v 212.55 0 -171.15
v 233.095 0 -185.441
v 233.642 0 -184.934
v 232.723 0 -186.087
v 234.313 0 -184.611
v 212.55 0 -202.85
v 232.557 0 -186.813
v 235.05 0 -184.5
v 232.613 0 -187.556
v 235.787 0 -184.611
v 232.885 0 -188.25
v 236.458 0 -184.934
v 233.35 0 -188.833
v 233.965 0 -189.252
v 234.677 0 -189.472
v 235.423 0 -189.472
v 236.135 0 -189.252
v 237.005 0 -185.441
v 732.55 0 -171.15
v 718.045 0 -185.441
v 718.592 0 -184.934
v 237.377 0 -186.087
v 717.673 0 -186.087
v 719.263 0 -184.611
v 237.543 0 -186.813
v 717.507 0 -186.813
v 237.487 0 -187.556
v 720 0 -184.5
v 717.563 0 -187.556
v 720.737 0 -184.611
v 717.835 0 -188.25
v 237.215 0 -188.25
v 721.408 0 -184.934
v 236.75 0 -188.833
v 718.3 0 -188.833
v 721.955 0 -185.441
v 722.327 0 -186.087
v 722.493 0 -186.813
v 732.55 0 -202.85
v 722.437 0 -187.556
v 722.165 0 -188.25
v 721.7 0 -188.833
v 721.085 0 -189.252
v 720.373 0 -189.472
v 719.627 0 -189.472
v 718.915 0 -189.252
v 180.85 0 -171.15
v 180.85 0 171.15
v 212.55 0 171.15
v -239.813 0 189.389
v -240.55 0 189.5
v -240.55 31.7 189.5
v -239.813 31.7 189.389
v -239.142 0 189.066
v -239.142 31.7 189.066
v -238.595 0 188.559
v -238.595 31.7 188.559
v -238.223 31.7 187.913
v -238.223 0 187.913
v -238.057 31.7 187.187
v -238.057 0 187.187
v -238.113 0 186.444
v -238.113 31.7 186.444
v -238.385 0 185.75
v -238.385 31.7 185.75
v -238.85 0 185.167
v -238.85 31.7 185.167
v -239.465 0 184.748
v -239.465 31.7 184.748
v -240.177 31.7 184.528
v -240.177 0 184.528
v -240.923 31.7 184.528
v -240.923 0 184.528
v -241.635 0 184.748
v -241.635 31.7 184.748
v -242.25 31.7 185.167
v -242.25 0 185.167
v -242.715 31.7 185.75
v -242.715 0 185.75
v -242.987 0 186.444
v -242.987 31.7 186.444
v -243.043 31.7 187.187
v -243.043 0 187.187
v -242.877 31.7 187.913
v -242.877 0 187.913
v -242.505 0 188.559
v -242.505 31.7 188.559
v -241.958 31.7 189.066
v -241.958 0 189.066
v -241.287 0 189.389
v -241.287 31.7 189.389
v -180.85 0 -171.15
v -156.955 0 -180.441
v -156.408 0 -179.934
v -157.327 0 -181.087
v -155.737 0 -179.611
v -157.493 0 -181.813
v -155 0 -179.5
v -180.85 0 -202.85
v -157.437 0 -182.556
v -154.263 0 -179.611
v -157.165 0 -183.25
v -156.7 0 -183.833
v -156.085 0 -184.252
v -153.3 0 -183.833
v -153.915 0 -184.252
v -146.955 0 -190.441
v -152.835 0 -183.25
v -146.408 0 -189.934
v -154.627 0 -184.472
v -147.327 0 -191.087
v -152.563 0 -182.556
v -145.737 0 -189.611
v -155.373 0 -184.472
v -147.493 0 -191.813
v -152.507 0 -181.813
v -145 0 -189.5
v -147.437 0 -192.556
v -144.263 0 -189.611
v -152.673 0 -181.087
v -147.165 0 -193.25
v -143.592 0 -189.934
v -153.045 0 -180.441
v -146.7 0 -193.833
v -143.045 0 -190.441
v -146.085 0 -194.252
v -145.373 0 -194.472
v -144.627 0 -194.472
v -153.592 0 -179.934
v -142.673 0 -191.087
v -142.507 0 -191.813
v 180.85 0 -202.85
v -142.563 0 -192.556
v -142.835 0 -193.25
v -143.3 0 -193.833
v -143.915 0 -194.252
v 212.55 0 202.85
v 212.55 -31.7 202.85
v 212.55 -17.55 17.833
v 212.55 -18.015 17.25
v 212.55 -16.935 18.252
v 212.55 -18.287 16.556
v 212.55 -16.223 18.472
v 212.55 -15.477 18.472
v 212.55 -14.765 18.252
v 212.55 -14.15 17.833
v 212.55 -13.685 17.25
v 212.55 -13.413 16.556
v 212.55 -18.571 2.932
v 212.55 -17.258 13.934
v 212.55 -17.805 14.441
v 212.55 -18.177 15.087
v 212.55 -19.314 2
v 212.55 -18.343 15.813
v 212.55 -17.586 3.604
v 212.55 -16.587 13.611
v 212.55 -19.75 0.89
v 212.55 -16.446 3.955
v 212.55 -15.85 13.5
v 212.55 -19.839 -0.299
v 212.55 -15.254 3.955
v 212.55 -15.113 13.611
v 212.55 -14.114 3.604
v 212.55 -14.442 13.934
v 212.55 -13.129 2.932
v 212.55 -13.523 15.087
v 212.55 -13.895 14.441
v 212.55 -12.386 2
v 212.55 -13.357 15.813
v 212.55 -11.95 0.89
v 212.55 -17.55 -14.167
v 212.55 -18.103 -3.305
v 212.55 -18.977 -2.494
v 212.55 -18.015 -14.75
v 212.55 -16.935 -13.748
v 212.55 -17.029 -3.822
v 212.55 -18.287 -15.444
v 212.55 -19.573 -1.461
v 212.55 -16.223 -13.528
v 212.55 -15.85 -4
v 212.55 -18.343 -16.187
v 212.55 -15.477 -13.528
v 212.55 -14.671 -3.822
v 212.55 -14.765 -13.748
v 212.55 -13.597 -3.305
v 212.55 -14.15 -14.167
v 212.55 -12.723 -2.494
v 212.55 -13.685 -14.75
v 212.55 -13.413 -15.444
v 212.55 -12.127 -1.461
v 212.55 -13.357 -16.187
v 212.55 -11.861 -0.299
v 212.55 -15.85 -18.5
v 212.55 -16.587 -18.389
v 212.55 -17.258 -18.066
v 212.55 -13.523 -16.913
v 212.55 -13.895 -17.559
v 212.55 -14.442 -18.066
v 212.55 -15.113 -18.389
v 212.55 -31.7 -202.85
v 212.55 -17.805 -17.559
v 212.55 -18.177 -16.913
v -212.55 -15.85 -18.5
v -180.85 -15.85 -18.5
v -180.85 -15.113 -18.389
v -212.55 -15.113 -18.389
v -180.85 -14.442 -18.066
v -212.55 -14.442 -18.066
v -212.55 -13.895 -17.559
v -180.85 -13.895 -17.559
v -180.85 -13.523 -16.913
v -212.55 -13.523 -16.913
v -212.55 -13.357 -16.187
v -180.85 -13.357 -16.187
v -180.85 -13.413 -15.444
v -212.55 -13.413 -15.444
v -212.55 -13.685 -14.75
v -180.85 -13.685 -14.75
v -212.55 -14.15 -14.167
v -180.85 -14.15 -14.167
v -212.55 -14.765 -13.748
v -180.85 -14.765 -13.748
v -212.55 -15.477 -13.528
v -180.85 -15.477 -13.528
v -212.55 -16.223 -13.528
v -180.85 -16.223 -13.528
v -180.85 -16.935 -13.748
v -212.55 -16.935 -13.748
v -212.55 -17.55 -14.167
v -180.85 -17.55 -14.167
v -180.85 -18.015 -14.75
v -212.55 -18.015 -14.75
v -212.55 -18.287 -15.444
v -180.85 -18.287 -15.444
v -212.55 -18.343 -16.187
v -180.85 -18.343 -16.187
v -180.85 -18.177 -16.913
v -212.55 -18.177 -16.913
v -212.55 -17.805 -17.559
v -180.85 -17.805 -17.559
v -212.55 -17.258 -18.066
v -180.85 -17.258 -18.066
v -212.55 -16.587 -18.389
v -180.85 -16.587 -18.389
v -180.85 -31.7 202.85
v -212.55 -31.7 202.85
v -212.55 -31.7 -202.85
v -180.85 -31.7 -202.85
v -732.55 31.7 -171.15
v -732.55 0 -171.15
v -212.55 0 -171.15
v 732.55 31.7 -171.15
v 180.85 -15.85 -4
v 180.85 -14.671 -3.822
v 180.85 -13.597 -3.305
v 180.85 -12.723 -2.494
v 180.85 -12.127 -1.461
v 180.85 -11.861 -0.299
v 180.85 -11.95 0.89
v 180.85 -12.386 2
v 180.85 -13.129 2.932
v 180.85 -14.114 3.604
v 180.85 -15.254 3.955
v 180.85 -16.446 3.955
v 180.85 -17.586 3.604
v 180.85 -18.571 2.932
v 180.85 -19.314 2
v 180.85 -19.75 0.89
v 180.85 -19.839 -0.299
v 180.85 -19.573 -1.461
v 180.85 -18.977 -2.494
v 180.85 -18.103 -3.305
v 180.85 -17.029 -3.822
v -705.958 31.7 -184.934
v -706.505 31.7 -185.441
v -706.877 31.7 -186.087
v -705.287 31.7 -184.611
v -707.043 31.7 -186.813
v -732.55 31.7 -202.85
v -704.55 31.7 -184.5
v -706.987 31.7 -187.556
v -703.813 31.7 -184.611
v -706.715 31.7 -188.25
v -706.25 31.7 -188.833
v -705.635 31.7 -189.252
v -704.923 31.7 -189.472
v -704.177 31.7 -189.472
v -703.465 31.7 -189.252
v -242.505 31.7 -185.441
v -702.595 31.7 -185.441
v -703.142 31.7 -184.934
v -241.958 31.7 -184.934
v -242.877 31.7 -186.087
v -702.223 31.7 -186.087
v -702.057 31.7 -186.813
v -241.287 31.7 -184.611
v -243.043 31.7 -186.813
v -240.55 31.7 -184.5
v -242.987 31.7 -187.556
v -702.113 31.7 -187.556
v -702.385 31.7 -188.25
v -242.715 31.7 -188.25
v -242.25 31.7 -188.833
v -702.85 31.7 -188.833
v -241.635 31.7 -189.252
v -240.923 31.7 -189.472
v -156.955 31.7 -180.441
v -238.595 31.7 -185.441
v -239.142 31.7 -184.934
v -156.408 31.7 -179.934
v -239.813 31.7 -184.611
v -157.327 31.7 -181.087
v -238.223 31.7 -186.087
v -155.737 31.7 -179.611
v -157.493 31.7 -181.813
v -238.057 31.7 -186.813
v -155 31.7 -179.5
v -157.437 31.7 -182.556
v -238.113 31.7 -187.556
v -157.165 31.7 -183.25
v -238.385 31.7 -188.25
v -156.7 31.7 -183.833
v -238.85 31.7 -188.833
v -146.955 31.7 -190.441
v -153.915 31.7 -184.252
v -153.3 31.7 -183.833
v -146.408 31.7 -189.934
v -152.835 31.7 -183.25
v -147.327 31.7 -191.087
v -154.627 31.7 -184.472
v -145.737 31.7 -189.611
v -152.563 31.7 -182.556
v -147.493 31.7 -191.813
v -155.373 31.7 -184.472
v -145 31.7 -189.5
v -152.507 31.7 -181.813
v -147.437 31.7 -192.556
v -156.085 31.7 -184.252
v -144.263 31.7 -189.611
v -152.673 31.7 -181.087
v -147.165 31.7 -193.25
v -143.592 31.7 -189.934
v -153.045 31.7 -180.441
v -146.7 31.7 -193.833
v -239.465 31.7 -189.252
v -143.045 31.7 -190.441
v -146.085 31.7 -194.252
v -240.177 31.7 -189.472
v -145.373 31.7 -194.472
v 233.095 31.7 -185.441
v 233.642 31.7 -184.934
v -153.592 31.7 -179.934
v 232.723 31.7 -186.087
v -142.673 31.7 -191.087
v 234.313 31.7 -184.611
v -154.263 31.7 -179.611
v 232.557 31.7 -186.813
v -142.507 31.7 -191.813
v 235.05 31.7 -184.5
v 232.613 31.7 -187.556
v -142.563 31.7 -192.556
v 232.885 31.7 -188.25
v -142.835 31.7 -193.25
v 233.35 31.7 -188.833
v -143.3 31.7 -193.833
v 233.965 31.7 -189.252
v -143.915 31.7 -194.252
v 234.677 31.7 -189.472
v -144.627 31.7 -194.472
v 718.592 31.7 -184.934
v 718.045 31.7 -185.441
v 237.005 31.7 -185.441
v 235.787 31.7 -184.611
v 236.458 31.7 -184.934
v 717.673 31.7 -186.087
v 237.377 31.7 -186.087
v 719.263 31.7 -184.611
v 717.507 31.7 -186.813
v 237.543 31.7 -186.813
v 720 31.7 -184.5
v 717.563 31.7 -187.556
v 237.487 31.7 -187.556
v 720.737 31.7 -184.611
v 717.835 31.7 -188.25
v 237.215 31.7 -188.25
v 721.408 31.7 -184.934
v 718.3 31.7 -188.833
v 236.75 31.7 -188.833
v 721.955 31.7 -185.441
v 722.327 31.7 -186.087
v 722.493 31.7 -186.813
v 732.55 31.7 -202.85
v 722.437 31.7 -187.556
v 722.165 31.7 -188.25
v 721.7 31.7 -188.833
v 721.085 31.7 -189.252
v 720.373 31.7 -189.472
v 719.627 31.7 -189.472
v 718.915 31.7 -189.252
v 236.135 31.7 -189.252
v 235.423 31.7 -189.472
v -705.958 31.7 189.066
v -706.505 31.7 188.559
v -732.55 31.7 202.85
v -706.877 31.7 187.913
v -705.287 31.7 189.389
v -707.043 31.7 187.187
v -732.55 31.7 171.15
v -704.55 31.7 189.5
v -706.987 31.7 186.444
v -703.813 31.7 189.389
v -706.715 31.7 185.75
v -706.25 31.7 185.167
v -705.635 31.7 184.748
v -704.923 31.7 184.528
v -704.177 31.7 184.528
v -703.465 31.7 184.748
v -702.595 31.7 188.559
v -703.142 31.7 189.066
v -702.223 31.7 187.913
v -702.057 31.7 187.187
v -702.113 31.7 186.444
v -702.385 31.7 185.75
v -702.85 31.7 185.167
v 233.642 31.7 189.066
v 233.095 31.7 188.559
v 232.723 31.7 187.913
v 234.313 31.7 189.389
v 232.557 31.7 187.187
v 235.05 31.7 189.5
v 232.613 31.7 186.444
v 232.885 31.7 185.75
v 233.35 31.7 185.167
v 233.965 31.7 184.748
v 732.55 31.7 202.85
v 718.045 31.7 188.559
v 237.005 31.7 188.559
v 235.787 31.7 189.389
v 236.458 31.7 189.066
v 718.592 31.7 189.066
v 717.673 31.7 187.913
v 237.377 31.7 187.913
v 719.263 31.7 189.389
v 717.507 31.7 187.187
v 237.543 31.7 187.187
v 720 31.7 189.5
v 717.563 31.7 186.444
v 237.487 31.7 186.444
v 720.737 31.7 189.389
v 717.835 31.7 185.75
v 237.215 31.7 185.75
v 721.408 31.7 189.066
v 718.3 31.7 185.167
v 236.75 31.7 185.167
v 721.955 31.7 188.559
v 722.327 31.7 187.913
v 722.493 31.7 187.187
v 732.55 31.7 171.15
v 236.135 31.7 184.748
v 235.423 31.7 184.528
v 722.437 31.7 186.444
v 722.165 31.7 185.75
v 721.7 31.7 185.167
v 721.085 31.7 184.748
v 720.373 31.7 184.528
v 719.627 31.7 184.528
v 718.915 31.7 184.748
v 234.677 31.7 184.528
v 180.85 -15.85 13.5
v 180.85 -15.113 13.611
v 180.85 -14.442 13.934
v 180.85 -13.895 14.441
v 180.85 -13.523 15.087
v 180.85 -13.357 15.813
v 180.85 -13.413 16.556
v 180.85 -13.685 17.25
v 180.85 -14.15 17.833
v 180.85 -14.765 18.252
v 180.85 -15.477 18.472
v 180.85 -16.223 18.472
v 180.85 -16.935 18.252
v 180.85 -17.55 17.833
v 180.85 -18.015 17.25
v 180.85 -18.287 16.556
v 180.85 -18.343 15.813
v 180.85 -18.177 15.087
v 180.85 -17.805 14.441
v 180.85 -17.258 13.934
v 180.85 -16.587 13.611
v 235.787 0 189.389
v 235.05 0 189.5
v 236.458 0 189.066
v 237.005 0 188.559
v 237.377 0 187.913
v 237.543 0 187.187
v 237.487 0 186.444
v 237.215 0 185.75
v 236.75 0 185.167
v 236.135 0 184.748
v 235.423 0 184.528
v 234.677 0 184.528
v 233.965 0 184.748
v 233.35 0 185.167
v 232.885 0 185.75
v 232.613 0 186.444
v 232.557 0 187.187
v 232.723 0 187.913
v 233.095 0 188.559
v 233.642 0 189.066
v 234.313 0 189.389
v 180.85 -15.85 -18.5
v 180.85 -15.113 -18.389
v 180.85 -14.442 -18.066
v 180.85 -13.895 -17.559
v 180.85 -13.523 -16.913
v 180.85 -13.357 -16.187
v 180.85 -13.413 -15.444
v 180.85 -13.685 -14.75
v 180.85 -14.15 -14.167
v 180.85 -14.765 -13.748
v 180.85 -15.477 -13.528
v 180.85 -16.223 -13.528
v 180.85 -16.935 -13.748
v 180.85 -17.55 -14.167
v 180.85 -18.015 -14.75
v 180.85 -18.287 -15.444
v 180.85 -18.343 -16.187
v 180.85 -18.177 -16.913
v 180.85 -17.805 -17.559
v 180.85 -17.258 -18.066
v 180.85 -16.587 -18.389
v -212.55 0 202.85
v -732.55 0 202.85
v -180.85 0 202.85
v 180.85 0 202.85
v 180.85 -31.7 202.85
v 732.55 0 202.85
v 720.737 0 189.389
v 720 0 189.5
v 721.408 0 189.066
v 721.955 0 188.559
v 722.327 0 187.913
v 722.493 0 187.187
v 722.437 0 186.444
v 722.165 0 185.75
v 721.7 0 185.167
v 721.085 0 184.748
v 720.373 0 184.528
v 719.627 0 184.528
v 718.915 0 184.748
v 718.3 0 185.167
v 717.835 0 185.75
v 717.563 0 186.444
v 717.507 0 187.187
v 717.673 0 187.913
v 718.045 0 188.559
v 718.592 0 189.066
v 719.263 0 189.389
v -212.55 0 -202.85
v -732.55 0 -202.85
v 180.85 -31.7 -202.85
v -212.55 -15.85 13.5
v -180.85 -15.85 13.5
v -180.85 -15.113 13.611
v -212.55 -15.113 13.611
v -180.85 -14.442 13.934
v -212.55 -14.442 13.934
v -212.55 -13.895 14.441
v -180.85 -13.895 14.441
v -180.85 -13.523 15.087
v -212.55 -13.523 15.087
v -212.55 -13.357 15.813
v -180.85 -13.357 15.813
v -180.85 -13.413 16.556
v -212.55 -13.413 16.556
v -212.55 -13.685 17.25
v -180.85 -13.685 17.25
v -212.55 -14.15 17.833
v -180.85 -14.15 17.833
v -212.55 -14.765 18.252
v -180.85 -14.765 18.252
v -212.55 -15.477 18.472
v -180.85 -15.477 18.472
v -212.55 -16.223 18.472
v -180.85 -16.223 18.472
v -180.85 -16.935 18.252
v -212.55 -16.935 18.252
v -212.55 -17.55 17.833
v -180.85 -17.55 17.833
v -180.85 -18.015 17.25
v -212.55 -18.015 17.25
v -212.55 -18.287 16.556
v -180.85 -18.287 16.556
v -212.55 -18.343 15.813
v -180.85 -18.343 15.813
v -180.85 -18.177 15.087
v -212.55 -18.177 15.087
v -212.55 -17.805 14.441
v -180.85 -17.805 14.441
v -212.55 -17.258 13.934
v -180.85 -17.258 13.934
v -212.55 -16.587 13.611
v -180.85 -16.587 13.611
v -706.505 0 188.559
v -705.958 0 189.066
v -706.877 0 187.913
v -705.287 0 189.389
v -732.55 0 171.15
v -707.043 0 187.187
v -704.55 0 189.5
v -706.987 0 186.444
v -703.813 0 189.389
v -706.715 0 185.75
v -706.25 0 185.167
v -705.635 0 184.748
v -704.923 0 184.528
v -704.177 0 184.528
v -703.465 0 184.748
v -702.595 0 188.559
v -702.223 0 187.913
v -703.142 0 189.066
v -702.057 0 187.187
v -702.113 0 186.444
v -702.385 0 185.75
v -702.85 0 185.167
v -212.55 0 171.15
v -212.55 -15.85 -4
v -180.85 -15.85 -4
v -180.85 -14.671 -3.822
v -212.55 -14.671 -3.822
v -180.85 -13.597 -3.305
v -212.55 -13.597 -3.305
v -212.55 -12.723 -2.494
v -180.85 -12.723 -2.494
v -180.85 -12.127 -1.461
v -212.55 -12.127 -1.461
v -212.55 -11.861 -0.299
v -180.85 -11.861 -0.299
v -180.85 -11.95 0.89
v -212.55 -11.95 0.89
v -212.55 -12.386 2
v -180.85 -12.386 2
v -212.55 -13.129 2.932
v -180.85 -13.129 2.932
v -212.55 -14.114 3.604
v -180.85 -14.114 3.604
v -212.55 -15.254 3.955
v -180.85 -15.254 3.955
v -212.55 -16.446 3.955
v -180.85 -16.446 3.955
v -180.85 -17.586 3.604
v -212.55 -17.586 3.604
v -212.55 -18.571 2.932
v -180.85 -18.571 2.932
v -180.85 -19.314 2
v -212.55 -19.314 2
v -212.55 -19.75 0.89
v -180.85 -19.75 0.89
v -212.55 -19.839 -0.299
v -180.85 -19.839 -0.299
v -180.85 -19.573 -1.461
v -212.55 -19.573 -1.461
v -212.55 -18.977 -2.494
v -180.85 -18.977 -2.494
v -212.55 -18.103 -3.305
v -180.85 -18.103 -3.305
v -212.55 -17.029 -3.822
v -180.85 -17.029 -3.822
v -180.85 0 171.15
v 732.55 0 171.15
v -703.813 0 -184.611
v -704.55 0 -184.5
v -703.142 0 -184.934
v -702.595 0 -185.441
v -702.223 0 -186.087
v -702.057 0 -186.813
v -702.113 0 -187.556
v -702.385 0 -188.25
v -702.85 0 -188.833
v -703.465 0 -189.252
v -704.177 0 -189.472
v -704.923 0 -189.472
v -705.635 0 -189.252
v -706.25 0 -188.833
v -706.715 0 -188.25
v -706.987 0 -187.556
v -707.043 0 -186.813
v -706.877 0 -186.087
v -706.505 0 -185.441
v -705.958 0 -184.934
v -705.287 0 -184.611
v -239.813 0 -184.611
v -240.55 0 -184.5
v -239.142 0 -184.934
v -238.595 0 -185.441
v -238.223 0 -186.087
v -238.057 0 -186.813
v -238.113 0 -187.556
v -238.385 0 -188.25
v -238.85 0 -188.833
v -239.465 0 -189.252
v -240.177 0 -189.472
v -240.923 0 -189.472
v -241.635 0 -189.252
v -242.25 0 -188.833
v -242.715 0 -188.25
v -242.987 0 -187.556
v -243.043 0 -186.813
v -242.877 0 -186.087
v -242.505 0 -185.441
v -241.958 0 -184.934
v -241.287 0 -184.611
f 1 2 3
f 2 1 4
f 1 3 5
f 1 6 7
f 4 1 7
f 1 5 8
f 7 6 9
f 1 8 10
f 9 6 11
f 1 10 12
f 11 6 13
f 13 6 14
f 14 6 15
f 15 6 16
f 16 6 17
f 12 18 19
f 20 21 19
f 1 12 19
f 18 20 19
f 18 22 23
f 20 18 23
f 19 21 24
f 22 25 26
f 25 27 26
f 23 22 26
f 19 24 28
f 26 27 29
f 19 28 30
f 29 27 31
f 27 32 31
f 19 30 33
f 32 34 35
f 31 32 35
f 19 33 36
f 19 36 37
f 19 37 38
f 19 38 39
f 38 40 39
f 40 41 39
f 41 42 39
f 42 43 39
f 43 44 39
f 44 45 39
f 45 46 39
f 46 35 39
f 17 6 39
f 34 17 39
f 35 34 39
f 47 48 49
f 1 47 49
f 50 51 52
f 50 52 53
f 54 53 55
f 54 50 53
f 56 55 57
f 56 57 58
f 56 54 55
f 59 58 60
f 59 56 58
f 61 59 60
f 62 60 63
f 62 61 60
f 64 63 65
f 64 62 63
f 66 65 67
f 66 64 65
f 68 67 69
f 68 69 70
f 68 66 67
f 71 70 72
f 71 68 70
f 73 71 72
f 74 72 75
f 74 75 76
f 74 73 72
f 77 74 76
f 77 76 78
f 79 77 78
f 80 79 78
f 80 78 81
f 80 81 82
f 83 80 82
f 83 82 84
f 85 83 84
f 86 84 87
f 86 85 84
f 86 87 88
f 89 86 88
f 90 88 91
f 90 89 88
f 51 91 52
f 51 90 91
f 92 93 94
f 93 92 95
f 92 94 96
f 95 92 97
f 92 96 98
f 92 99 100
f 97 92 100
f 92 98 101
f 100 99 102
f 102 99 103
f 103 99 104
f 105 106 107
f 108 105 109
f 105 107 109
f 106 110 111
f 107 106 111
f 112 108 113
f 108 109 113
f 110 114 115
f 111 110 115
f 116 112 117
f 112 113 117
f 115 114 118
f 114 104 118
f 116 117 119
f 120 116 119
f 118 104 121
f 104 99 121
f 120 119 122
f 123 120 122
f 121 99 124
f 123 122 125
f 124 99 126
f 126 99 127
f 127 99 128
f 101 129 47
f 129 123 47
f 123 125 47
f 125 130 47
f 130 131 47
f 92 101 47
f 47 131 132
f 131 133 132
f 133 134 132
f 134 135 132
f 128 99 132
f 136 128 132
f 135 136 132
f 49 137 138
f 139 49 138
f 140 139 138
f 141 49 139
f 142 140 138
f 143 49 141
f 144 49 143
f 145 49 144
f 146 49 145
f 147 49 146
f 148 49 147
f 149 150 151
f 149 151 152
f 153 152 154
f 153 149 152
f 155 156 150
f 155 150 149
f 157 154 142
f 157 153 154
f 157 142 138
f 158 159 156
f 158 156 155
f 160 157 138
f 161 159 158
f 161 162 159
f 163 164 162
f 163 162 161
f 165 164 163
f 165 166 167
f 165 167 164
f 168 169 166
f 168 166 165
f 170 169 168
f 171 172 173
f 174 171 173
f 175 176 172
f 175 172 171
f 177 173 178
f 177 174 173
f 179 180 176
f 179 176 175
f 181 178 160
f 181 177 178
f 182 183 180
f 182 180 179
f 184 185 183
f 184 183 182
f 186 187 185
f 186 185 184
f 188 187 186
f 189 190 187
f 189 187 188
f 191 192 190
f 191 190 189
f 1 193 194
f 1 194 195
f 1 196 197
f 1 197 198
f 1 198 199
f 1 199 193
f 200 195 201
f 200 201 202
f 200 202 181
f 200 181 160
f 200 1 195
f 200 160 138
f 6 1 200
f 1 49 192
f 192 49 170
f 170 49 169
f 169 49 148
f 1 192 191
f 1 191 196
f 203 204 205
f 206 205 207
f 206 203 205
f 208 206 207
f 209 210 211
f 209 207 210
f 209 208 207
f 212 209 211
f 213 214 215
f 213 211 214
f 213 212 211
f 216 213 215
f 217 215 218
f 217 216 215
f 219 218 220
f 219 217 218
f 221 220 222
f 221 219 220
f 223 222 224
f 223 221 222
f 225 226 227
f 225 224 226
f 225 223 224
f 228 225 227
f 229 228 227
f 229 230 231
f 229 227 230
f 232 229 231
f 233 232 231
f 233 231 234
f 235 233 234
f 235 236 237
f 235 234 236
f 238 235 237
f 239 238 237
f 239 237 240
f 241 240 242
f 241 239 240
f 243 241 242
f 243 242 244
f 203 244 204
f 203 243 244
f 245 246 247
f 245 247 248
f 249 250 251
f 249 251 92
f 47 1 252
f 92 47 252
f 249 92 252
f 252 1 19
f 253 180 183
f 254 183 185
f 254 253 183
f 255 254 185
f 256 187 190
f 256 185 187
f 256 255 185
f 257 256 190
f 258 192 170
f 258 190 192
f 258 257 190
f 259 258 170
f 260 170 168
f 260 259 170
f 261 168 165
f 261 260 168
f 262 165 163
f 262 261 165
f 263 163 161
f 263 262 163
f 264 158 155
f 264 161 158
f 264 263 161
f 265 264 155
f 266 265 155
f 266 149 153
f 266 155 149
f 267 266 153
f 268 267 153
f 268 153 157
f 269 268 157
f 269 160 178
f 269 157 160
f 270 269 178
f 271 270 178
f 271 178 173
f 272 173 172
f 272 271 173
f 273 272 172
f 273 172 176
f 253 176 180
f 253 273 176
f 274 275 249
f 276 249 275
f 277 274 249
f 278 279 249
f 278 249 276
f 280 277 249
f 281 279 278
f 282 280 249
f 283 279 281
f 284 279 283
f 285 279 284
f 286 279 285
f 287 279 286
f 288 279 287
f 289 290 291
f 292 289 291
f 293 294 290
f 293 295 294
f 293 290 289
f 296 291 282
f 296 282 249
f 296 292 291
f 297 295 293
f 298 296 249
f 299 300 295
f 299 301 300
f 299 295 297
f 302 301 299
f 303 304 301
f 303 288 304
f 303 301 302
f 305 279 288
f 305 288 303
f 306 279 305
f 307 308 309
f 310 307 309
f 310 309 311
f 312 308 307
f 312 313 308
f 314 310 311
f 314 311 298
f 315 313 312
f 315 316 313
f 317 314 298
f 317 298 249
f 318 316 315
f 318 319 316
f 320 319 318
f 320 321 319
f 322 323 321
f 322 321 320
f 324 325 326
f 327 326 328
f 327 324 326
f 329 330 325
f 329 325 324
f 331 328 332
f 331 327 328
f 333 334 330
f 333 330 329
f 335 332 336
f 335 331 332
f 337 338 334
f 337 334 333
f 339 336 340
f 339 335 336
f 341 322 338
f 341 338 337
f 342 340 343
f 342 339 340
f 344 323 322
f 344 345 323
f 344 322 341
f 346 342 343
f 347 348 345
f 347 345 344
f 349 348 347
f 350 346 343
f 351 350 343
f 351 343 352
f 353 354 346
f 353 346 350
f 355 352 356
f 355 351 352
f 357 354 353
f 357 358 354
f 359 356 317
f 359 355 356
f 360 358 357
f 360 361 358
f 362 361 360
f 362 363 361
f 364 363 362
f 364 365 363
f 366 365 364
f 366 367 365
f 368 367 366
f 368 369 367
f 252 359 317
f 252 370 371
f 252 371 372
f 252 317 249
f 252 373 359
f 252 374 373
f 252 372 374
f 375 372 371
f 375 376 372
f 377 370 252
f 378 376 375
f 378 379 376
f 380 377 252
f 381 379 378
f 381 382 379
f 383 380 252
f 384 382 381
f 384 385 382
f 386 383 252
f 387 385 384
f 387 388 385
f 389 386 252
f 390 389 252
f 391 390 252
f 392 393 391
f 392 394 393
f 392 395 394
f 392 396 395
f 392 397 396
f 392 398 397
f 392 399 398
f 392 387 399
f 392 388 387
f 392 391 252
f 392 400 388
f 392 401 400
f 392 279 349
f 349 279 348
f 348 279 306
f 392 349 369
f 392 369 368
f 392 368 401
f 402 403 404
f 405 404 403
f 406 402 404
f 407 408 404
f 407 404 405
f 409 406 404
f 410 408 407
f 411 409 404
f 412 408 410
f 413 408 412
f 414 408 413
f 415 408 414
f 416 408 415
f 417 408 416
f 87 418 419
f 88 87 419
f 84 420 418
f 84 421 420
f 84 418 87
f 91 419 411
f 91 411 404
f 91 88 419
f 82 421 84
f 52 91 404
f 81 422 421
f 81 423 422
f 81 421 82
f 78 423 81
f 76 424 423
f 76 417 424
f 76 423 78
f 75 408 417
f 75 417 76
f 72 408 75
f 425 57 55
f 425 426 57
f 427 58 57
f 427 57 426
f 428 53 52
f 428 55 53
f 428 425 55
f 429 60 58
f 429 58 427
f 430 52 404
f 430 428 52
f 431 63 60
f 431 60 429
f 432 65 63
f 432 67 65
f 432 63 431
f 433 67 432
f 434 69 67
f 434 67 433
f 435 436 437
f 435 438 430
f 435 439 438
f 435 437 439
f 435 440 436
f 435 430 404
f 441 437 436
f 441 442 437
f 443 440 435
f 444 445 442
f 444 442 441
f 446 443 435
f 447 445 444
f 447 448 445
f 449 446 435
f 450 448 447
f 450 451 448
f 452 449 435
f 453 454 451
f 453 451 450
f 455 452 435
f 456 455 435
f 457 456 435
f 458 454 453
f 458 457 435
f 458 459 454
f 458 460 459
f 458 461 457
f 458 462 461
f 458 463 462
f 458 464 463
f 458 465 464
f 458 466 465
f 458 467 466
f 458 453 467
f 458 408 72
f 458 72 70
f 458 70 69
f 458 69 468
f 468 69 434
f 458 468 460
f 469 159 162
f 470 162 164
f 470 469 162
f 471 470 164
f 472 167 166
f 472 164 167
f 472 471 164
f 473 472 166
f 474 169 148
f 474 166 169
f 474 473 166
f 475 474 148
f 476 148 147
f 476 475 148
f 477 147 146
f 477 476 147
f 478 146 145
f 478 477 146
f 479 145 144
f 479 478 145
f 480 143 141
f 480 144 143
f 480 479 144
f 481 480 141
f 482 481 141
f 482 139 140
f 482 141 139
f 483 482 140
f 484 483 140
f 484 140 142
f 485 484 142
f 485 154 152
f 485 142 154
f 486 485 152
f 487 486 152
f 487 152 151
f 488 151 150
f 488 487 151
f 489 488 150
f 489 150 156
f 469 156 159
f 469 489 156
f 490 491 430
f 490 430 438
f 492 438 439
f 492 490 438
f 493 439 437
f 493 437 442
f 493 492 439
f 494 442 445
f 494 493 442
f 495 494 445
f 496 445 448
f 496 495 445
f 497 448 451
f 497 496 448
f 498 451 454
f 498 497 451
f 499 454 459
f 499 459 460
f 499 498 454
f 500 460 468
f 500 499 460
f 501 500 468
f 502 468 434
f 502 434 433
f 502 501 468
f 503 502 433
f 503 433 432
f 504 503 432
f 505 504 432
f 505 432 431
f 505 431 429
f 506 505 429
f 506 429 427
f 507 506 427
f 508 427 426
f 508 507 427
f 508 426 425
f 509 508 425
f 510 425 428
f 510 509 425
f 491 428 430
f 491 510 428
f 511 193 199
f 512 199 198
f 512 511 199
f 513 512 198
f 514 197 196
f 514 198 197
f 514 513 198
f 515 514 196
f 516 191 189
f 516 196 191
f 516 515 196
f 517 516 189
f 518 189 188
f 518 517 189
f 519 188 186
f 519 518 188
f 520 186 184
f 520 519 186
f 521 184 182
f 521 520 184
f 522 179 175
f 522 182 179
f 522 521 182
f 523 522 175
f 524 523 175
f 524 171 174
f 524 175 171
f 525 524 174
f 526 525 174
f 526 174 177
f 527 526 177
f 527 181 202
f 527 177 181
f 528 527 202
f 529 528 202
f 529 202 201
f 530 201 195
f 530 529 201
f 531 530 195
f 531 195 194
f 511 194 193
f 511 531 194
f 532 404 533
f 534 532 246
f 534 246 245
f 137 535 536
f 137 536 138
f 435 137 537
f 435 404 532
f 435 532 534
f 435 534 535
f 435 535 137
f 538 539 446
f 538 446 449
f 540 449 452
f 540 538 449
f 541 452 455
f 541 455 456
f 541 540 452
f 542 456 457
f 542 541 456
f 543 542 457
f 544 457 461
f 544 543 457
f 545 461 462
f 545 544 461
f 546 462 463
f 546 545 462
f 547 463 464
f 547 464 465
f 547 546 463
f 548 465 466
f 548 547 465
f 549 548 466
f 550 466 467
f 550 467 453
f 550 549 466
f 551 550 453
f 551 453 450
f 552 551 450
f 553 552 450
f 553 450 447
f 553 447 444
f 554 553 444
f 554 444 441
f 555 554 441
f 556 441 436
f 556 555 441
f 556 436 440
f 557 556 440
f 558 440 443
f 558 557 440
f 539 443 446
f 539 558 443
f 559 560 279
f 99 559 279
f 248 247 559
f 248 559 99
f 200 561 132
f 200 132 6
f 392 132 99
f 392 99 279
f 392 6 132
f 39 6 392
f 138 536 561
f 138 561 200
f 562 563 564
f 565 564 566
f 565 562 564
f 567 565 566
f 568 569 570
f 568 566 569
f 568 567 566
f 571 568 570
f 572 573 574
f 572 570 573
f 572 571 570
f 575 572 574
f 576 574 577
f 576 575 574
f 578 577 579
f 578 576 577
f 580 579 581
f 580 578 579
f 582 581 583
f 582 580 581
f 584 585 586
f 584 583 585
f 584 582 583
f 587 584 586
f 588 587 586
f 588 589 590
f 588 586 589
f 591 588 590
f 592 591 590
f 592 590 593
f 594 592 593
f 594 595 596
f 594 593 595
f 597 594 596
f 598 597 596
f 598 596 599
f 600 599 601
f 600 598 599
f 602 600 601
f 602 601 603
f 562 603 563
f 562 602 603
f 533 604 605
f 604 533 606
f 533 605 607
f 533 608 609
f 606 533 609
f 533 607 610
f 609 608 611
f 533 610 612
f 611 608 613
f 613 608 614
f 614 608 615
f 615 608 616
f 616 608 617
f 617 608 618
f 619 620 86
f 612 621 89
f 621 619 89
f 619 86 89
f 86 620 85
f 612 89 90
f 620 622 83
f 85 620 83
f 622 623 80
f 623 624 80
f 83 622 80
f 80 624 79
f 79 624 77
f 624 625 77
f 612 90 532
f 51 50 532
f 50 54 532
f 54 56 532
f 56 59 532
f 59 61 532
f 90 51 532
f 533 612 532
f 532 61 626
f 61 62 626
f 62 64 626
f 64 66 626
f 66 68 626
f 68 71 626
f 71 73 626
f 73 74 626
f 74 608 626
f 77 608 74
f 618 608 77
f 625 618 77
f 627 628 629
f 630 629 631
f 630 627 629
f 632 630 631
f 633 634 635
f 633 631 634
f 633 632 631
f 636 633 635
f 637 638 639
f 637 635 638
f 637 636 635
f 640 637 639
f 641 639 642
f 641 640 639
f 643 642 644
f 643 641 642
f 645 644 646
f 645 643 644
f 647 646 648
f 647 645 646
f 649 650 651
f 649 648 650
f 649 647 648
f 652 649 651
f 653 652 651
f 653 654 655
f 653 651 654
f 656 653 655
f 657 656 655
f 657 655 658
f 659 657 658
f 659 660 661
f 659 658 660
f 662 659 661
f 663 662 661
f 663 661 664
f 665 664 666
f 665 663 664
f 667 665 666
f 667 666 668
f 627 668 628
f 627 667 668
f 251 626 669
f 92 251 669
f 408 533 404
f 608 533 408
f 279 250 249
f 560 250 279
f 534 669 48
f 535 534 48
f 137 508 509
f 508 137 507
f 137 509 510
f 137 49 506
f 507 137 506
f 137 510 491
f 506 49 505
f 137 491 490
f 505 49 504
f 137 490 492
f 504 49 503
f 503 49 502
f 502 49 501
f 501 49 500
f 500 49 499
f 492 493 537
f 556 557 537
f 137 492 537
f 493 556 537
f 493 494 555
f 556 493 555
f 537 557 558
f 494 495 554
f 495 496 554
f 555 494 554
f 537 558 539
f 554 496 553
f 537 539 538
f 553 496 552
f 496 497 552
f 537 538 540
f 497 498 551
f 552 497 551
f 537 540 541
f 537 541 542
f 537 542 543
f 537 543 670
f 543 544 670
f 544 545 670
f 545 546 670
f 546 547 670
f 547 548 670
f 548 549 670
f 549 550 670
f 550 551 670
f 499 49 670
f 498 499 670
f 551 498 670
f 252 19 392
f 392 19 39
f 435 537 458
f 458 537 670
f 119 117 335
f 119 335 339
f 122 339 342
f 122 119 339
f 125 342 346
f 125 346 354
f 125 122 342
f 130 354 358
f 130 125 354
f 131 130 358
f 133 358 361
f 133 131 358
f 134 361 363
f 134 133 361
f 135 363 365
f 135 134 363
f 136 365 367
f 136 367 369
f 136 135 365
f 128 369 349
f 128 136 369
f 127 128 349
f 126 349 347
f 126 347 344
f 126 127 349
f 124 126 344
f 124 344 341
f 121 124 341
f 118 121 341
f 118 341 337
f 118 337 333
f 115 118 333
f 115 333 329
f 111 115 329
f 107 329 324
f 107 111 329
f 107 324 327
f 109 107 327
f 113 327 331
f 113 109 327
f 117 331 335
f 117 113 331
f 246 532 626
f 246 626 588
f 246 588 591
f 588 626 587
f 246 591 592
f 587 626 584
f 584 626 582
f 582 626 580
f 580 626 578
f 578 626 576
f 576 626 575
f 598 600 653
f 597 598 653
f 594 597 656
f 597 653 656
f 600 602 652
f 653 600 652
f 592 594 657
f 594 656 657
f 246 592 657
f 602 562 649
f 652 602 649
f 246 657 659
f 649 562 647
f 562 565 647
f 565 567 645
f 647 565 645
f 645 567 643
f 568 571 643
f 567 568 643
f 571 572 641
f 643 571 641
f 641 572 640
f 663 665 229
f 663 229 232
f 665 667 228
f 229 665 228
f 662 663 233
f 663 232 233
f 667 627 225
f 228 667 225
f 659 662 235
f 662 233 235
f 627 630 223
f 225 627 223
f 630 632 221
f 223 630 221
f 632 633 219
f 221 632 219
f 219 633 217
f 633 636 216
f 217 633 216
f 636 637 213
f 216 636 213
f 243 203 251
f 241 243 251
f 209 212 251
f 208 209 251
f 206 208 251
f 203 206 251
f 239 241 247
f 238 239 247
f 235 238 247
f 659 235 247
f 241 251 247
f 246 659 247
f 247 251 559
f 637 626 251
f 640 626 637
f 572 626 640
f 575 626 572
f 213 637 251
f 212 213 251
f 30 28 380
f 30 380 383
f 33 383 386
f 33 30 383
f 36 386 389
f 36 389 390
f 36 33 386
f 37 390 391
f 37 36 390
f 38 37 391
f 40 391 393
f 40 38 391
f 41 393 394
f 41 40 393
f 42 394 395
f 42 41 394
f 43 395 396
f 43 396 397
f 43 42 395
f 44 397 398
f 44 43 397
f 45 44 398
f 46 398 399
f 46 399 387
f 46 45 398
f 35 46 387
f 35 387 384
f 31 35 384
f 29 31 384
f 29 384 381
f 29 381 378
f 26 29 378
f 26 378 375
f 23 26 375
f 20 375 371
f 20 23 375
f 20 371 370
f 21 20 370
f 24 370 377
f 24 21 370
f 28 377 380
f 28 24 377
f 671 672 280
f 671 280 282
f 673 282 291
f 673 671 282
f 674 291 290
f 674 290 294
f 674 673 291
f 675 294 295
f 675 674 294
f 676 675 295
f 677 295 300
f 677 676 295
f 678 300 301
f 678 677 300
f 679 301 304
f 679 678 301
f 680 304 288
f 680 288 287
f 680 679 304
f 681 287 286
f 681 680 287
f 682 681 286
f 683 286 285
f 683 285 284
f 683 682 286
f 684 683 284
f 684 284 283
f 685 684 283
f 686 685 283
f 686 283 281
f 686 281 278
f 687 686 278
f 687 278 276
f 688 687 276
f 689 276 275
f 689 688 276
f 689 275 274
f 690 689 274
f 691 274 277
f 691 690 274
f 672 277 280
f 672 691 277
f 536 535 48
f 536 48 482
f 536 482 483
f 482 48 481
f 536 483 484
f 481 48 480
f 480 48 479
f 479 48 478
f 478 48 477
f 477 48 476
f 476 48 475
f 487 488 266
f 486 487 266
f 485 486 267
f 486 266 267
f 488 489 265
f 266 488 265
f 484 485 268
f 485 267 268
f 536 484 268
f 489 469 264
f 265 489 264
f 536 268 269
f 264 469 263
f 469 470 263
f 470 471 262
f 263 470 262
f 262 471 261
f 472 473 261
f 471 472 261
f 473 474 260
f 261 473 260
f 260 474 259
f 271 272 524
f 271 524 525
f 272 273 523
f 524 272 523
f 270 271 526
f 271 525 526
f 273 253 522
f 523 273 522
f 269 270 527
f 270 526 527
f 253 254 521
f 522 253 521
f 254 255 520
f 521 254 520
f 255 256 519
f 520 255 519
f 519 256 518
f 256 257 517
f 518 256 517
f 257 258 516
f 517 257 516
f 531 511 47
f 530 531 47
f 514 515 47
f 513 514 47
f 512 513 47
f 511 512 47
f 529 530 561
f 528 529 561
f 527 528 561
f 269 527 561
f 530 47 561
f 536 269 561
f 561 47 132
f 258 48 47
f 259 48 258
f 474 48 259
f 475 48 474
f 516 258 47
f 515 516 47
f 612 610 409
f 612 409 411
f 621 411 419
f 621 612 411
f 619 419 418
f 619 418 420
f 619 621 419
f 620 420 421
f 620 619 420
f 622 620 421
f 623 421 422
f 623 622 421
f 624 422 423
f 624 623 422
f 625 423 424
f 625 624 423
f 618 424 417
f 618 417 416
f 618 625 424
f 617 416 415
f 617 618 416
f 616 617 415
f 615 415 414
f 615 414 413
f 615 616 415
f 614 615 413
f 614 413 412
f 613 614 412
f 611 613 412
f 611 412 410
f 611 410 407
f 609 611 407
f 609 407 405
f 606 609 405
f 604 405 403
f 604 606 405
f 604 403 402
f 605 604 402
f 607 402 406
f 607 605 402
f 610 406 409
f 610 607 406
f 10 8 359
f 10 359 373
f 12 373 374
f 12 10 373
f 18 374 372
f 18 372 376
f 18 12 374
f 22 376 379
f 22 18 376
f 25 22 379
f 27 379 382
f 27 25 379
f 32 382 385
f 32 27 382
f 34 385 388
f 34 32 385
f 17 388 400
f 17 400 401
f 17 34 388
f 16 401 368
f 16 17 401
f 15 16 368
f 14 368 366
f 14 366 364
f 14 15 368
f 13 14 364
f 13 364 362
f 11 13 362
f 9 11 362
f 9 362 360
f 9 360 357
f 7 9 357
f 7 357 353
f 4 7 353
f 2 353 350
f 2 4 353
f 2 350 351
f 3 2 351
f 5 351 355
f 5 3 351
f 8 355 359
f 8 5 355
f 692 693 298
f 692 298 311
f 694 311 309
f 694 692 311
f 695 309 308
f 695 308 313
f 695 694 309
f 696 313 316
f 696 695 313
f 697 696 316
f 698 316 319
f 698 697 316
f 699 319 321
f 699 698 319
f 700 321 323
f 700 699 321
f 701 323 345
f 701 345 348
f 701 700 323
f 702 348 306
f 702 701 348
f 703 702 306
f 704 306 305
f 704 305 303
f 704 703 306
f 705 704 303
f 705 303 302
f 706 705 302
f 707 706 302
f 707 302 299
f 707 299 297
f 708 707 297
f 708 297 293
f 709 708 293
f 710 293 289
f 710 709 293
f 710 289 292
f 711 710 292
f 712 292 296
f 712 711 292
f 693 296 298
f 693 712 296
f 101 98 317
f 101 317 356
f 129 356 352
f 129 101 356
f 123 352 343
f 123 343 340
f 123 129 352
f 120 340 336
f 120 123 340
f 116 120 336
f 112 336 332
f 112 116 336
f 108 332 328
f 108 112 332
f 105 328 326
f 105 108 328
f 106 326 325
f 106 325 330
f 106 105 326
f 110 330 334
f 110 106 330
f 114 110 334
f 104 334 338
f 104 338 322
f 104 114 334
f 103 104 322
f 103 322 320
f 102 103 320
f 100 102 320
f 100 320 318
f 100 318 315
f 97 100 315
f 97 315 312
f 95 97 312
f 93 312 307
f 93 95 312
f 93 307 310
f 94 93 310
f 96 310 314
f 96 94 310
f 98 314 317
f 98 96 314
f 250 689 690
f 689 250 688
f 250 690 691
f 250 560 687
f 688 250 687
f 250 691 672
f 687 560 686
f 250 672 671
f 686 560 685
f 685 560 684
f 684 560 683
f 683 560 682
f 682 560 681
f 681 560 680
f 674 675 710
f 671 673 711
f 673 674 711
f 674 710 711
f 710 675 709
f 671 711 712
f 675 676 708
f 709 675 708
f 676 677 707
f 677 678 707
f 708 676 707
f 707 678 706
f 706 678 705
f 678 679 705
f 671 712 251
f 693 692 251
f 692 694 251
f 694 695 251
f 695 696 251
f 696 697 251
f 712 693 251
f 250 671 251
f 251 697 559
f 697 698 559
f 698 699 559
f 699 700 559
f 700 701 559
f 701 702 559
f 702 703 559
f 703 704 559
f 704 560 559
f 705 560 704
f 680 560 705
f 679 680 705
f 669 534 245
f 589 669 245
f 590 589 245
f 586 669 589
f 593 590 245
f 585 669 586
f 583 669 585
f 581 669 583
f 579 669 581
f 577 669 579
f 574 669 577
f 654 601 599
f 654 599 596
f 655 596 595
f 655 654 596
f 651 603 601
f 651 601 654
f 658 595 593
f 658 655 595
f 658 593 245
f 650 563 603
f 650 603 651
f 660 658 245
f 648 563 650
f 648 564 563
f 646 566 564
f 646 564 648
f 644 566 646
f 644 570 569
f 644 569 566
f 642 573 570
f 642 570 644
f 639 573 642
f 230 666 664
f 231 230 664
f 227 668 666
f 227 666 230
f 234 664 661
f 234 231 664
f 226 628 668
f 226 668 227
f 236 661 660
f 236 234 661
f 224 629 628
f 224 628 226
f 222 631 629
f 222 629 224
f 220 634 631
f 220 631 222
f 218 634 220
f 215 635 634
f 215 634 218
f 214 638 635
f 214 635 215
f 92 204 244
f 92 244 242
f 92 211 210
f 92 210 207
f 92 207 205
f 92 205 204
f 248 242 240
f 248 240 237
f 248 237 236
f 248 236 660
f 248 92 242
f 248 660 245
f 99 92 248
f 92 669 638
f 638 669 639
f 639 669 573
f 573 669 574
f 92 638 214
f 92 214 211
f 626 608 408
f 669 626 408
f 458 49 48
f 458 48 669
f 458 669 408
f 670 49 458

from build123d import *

# Parameters (mm, degrees)
ESBO_O1_W                  = 31.7
ESBO_O1_H                  = 405.7
RESSALTO_EXTRUS_O1_DEPTH   = 31.7
RESSALTO_EXTRUS_O1_2_DEPTH = 31.7
ESBO_O3_W                  = 1465.1
ESBO_O3_H                  = 31.7
RESSALTO_EXTRUS_O2_DEPTH   = 31.7
ESBO_O4_R                  = 2.5
CORTE_EXTRUS_O2_DEPTH      = 31.7
CORTE_EXTRUS_O3_DEPTH      = 761.777572619
CORTE_EXTRUS_O3_DEPTH_BACK = 761.777572619
ESBO_O5_R                  = 2.5
ESBO_O5_R_2                = 4


with BuildPart() as part:
    # Esboço1 → Ressalto-extrusão1 (new body)
    with BuildSketch(Plane(origin=(0, 0, 0), x_dir=(1, 0, 0), z_dir=(0, 1, 0))):
        with Locations((-196.7, 0)):
            Rectangle(ESBO_O1_W, ESBO_O1_H)
    extrude(amount=-RESSALTO_EXTRUS_O1_DEPTH)



with BuildPart() as body_2:
    # Esboço1 → Ressalto-extrus_o1 2 (new body)
    with BuildSketch(Plane(origin=(0, 0, 0), x_dir=(1, 0, 0), z_dir=(0, 1, 0))):
        with Locations((196.7, 0)):
            Rectangle(ESBO_O1_W, ESBO_O1_H)
    extrude(amount=-RESSALTO_EXTRUS_O1_2_DEPTH)


with BuildPart() as part_1:
    add(part.part)

    add(body_2.part)  # Ressalto-extrusão2 merges body 2
    # Esboço3 → Ressalto-extrusão2 (add)
    with BuildSketch(Plane(origin=(0, 0, 0), x_dir=(1, 0, 0), z_dir=(0, 1, 0))):
        with Locations((0, 187)):
            Rectangle(ESBO_O3_W, ESBO_O3_H)
        with Locations((0, -187)):
            Rectangle(ESBO_O3_W, ESBO_O3_H)
    extrude(amount=RESSALTO_EXTRUS_O2_DEPTH)

    # Esboço4 → Corte-extrusão2 (cut)
    with BuildSketch(Plane(origin=(0, 0, 0), x_dir=(1, 0, 0), z_dir=(0, 1, 0))):
        with Locations(Location((720, 187, 0), (0, 0, 270))):
            Circle(ESBO_O4_R)
        with Locations(Location((720, -187, 0), (0, 0, 270))):
            Circle(ESBO_O4_R)
        with Locations(Location((235.05, 187, 0), (0, 0, 270))):
            Circle(ESBO_O4_R)
        with Locations(Location((235.05, -187, 0), (0, 0, 270))):
            Circle(ESBO_O4_R)
        with Locations(Location((-704.55, 187, 0), (0, 0, 270))):
            Circle(ESBO_O4_R)
        with Locations(Location((-704.55, -187, 0), (0, 0, 270))):
            Circle(ESBO_O4_R)
        with Locations(Location((-240.55, 187, 0), (0, 0, 270))):
            Circle(ESBO_O4_R)
        with Locations(Location((-240.55, -187, 0), (0, 0, 270))):
            Circle(ESBO_O4_R)
        with Locations(Location((-155, 182, 0), (0, 0, 270))):
            Circle(ESBO_O4_R)
        with Locations(Location((-145, 192, 0), (0, 0, 270))):
            Circle(ESBO_O4_R)
    extrude(amount=CORTE_EXTRUS_O2_DEPTH, mode=Mode.SUBTRACT)

    # Esboço5 → Corte-extrusão3 (cut, two sides: drawn at the far end of the back side and taken through both)
    with BuildSketch(Plane(origin=(0, 0, 0), x_dir=(0, 0, -1), z_dir=(1, 0, 0)).offset(-CORTE_EXTRUS_O3_DEPTH_BACK)):
        with Locations((16, -15.85)):
            Circle(ESBO_O5_R)
        with Locations((-16, -15.85)):
            Circle(ESBO_O5_R)
        with Locations((0, -15.85)):
            Circle(ESBO_O5_R_2)
    extrude(amount=CORTE_EXTRUS_O3_DEPTH + CORTE_EXTRUS_O3_DEPTH_BACK, mode=Mode.SUBTRACT)


solid = part_1.part
